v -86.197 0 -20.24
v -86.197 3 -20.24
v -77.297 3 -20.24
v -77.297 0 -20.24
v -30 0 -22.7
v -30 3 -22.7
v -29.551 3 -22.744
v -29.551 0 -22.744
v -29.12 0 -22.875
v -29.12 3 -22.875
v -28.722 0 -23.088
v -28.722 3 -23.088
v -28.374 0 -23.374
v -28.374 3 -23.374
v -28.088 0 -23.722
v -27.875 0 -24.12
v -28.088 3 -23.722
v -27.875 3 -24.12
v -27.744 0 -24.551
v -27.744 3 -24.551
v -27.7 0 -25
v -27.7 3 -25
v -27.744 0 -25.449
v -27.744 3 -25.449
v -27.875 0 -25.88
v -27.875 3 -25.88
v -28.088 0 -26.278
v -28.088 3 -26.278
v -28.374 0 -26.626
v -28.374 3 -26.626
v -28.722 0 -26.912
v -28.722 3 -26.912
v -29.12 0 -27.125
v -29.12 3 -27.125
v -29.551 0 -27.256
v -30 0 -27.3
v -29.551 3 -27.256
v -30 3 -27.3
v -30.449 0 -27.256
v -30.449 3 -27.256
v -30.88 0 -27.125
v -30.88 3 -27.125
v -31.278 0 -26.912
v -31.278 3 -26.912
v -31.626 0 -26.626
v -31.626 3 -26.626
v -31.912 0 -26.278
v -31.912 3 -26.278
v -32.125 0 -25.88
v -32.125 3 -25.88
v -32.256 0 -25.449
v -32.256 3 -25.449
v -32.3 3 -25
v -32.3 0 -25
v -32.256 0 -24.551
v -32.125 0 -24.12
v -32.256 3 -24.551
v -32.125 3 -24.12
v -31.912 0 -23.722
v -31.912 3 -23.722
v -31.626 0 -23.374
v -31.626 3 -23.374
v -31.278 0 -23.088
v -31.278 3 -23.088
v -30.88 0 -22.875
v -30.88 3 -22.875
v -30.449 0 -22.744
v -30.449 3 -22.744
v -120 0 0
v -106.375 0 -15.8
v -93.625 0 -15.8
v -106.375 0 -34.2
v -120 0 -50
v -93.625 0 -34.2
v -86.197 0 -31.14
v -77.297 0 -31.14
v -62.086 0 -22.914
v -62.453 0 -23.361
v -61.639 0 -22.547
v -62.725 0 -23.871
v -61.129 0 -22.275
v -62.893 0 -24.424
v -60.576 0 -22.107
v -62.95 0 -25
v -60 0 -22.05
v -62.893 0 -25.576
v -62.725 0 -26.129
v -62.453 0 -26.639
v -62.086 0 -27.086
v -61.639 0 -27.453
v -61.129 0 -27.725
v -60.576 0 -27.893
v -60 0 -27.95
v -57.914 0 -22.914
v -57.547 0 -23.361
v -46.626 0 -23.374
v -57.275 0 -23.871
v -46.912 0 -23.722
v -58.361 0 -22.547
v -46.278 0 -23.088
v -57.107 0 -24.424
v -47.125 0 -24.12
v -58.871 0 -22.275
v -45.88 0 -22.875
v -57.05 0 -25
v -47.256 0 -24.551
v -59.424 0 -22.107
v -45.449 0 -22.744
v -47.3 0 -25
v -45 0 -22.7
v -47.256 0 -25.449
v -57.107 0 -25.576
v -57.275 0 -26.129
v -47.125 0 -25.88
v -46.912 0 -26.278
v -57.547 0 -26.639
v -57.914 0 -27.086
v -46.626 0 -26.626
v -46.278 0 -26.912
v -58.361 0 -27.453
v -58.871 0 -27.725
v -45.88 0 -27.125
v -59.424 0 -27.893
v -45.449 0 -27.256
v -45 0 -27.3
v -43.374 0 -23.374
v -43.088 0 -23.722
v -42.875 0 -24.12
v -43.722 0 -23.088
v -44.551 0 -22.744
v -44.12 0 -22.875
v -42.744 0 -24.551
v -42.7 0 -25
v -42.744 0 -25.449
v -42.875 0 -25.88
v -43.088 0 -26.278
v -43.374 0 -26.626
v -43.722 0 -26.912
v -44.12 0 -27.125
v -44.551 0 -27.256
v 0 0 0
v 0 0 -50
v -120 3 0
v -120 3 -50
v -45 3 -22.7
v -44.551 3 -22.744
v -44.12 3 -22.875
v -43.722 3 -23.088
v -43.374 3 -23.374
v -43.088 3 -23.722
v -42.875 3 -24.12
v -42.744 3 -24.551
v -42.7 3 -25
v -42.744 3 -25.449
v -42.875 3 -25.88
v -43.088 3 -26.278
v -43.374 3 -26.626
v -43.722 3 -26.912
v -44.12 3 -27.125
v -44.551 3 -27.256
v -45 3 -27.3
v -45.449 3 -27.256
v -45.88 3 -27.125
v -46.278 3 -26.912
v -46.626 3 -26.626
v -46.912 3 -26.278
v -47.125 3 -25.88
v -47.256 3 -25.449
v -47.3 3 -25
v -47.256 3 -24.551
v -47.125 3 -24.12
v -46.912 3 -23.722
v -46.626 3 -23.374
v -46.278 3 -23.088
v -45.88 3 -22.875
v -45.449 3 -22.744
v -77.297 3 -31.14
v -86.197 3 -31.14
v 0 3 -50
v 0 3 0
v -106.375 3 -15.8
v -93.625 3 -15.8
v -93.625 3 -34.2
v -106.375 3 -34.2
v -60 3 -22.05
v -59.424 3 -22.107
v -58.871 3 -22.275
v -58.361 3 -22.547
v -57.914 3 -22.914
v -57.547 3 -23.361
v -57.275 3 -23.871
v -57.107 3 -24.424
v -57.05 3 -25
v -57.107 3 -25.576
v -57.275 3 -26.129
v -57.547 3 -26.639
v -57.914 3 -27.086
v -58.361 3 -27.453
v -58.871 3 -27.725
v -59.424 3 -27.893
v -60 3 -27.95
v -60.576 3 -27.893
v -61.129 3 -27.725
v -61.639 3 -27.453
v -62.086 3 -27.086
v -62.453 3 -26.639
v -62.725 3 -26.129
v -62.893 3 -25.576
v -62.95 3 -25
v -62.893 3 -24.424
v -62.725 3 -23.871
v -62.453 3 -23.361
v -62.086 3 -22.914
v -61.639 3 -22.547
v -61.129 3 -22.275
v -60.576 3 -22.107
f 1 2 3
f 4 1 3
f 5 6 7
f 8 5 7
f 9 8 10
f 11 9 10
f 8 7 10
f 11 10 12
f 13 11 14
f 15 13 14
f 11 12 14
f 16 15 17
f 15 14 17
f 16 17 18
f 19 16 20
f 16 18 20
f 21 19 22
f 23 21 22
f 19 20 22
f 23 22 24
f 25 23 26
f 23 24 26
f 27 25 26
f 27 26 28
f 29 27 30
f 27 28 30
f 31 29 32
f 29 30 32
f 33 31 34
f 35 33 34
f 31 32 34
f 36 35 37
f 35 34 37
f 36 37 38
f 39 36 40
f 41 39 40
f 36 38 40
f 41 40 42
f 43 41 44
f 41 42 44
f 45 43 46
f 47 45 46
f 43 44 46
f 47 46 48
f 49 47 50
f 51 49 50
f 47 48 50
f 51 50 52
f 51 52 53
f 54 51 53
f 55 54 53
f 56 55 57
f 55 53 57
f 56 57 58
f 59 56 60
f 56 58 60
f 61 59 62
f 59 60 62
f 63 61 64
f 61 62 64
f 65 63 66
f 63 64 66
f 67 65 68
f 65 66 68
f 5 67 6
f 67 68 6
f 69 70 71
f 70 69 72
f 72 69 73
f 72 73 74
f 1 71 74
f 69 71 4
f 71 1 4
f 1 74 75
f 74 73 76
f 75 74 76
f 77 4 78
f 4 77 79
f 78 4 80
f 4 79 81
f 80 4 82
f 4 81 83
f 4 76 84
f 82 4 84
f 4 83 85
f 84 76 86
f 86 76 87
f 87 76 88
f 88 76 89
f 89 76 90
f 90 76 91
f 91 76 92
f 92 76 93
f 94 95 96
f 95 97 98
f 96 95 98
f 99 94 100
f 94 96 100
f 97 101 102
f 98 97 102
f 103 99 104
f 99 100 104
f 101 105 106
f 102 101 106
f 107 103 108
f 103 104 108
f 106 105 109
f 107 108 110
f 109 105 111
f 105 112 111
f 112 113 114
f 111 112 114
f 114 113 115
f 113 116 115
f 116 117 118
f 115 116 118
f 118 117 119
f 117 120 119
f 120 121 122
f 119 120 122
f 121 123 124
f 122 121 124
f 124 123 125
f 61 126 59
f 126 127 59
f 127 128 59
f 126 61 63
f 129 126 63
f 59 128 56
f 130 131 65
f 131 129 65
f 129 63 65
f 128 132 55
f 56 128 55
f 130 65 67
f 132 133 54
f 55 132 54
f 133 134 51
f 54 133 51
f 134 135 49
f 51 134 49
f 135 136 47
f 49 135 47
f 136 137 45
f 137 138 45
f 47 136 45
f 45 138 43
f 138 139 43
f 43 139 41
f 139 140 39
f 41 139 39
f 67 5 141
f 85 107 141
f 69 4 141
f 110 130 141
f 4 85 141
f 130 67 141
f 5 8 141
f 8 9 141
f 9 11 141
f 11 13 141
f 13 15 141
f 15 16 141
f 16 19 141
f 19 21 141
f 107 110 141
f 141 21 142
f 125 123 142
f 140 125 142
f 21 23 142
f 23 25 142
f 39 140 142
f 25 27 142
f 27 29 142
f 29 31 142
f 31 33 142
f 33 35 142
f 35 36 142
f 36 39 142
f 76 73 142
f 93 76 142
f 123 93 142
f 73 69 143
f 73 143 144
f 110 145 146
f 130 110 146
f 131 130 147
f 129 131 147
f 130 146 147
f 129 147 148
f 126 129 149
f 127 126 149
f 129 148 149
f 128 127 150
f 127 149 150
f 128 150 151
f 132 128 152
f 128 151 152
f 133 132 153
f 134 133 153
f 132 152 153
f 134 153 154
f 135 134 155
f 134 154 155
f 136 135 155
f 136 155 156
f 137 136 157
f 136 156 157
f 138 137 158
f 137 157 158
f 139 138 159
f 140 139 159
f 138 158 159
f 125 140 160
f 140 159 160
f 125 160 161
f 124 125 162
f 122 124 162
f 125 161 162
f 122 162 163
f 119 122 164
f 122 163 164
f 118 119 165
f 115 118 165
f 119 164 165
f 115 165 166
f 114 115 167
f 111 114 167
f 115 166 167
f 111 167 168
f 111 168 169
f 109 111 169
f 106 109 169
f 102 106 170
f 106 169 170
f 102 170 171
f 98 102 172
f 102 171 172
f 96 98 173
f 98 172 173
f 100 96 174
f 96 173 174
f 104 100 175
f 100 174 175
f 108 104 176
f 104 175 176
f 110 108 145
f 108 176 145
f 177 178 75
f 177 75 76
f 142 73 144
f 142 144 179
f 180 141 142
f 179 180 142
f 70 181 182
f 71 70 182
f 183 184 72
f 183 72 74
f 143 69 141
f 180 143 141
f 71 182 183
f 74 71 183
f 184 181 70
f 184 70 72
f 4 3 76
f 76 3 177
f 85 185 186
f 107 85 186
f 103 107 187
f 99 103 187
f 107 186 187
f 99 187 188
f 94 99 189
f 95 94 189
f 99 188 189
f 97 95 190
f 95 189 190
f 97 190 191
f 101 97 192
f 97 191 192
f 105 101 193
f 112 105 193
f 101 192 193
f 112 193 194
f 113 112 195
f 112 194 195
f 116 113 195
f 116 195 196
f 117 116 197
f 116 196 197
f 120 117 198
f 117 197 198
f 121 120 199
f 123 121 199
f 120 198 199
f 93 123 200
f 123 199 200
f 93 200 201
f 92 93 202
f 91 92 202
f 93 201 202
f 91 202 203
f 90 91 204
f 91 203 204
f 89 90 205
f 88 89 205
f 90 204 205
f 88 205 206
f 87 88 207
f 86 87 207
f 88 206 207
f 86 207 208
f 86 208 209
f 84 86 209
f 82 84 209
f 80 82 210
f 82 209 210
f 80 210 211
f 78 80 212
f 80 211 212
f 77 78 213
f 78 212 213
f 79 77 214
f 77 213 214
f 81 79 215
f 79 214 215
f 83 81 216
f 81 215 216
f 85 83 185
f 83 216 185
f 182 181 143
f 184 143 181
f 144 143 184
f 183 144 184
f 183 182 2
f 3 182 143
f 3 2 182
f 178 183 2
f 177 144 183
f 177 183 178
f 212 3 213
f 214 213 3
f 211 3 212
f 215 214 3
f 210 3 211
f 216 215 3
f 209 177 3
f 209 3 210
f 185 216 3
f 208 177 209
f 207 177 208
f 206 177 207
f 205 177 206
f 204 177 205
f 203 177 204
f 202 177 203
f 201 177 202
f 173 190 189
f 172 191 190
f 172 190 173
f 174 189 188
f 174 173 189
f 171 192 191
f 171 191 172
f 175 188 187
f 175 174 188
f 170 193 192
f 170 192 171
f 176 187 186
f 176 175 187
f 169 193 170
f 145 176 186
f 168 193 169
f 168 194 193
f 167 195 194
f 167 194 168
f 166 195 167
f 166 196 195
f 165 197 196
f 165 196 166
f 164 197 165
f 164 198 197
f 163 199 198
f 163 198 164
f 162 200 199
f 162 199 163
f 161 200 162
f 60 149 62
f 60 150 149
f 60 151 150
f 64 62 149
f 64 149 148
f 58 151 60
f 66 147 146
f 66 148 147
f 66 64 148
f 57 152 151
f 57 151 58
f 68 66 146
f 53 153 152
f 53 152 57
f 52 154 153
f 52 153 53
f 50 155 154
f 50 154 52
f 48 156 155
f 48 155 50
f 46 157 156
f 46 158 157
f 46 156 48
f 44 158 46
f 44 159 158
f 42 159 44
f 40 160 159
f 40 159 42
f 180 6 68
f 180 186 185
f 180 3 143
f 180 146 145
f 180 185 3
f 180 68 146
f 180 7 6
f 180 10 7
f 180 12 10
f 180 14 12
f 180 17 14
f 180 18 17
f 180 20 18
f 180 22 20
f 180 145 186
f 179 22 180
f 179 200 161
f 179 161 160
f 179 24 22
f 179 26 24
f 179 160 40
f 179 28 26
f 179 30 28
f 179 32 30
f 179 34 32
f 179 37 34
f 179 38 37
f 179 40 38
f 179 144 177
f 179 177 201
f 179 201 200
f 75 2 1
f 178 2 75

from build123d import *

# Parameters (mm, degrees)
SKETCH1_W           = 120
SKETCH1_H           = 50
BOSS_EXTRUDE1_DEPTH = 3
SKETCH2_R           = 2.95
SKETCH2_R_2         = 2.3
SKETCH2_W           = 12.75
SKETCH2_H           = 18.4
CUT_EXTRUDE1_DEPTH  = 3
SKETCH3_W           = 8.9
SKETCH3_H           = 10.9
CUT_EXTRUDE2_DEPTH  = 10


with BuildPart() as part:
    # Sketch1 → Boss-Extrude1 (new body)
    with BuildSketch(Plane(origin=(0, 0, 0), x_dir=(1, 0, 0), z_dir=(0, 1, 0))):
        with Locations((-60, 25)):
            Rectangle(SKETCH1_W, SKETCH1_H)
    extrude(amount=BOSS_EXTRUDE1_DEPTH)

    # Sketch2 → Cut-Extrude1 (cut)
    with BuildSketch(Plane(origin=(0, 3, 0), x_dir=(1, 0, 0), z_dir=(0, 1, 0))):
        with Locations(Location((-60, 25, 0), (0, 0, 270))):  # turned: the seam where the file's is
            Circle(SKETCH2_R)
        with Locations(Location((-45, 25, 0), (0, 0, 270))):  # turned: the seam where the file's is
            Circle(SKETCH2_R_2)
        with Locations(Location((-30, 25, 0), (0, 0, 270))):  # turned: the seam where the file's is
            Circle(SKETCH2_R_2)
        with Locations((-100, 25)):
            Rectangle(SKETCH2_W, SKETCH2_H)
    extrude(amount=-CUT_EXTRUDE1_DEPTH, mode=Mode.SUBTRACT)

    # Sketch3 → Cut-Extrude2 (cut)
    with BuildSketch(Plane(origin=(0, 3, 0), x_dir=(1, 0, 0), z_dir=(0, 1, 0))):
        with Locations((-81.74741462, 25.690314881)):
            Rectangle(SKETCH3_W, SKETCH3_H)
    extrude(amount=-CUT_EXTRUDE2_DEPTH, mode=Mode.SUBTRACT)


solid = part.part
